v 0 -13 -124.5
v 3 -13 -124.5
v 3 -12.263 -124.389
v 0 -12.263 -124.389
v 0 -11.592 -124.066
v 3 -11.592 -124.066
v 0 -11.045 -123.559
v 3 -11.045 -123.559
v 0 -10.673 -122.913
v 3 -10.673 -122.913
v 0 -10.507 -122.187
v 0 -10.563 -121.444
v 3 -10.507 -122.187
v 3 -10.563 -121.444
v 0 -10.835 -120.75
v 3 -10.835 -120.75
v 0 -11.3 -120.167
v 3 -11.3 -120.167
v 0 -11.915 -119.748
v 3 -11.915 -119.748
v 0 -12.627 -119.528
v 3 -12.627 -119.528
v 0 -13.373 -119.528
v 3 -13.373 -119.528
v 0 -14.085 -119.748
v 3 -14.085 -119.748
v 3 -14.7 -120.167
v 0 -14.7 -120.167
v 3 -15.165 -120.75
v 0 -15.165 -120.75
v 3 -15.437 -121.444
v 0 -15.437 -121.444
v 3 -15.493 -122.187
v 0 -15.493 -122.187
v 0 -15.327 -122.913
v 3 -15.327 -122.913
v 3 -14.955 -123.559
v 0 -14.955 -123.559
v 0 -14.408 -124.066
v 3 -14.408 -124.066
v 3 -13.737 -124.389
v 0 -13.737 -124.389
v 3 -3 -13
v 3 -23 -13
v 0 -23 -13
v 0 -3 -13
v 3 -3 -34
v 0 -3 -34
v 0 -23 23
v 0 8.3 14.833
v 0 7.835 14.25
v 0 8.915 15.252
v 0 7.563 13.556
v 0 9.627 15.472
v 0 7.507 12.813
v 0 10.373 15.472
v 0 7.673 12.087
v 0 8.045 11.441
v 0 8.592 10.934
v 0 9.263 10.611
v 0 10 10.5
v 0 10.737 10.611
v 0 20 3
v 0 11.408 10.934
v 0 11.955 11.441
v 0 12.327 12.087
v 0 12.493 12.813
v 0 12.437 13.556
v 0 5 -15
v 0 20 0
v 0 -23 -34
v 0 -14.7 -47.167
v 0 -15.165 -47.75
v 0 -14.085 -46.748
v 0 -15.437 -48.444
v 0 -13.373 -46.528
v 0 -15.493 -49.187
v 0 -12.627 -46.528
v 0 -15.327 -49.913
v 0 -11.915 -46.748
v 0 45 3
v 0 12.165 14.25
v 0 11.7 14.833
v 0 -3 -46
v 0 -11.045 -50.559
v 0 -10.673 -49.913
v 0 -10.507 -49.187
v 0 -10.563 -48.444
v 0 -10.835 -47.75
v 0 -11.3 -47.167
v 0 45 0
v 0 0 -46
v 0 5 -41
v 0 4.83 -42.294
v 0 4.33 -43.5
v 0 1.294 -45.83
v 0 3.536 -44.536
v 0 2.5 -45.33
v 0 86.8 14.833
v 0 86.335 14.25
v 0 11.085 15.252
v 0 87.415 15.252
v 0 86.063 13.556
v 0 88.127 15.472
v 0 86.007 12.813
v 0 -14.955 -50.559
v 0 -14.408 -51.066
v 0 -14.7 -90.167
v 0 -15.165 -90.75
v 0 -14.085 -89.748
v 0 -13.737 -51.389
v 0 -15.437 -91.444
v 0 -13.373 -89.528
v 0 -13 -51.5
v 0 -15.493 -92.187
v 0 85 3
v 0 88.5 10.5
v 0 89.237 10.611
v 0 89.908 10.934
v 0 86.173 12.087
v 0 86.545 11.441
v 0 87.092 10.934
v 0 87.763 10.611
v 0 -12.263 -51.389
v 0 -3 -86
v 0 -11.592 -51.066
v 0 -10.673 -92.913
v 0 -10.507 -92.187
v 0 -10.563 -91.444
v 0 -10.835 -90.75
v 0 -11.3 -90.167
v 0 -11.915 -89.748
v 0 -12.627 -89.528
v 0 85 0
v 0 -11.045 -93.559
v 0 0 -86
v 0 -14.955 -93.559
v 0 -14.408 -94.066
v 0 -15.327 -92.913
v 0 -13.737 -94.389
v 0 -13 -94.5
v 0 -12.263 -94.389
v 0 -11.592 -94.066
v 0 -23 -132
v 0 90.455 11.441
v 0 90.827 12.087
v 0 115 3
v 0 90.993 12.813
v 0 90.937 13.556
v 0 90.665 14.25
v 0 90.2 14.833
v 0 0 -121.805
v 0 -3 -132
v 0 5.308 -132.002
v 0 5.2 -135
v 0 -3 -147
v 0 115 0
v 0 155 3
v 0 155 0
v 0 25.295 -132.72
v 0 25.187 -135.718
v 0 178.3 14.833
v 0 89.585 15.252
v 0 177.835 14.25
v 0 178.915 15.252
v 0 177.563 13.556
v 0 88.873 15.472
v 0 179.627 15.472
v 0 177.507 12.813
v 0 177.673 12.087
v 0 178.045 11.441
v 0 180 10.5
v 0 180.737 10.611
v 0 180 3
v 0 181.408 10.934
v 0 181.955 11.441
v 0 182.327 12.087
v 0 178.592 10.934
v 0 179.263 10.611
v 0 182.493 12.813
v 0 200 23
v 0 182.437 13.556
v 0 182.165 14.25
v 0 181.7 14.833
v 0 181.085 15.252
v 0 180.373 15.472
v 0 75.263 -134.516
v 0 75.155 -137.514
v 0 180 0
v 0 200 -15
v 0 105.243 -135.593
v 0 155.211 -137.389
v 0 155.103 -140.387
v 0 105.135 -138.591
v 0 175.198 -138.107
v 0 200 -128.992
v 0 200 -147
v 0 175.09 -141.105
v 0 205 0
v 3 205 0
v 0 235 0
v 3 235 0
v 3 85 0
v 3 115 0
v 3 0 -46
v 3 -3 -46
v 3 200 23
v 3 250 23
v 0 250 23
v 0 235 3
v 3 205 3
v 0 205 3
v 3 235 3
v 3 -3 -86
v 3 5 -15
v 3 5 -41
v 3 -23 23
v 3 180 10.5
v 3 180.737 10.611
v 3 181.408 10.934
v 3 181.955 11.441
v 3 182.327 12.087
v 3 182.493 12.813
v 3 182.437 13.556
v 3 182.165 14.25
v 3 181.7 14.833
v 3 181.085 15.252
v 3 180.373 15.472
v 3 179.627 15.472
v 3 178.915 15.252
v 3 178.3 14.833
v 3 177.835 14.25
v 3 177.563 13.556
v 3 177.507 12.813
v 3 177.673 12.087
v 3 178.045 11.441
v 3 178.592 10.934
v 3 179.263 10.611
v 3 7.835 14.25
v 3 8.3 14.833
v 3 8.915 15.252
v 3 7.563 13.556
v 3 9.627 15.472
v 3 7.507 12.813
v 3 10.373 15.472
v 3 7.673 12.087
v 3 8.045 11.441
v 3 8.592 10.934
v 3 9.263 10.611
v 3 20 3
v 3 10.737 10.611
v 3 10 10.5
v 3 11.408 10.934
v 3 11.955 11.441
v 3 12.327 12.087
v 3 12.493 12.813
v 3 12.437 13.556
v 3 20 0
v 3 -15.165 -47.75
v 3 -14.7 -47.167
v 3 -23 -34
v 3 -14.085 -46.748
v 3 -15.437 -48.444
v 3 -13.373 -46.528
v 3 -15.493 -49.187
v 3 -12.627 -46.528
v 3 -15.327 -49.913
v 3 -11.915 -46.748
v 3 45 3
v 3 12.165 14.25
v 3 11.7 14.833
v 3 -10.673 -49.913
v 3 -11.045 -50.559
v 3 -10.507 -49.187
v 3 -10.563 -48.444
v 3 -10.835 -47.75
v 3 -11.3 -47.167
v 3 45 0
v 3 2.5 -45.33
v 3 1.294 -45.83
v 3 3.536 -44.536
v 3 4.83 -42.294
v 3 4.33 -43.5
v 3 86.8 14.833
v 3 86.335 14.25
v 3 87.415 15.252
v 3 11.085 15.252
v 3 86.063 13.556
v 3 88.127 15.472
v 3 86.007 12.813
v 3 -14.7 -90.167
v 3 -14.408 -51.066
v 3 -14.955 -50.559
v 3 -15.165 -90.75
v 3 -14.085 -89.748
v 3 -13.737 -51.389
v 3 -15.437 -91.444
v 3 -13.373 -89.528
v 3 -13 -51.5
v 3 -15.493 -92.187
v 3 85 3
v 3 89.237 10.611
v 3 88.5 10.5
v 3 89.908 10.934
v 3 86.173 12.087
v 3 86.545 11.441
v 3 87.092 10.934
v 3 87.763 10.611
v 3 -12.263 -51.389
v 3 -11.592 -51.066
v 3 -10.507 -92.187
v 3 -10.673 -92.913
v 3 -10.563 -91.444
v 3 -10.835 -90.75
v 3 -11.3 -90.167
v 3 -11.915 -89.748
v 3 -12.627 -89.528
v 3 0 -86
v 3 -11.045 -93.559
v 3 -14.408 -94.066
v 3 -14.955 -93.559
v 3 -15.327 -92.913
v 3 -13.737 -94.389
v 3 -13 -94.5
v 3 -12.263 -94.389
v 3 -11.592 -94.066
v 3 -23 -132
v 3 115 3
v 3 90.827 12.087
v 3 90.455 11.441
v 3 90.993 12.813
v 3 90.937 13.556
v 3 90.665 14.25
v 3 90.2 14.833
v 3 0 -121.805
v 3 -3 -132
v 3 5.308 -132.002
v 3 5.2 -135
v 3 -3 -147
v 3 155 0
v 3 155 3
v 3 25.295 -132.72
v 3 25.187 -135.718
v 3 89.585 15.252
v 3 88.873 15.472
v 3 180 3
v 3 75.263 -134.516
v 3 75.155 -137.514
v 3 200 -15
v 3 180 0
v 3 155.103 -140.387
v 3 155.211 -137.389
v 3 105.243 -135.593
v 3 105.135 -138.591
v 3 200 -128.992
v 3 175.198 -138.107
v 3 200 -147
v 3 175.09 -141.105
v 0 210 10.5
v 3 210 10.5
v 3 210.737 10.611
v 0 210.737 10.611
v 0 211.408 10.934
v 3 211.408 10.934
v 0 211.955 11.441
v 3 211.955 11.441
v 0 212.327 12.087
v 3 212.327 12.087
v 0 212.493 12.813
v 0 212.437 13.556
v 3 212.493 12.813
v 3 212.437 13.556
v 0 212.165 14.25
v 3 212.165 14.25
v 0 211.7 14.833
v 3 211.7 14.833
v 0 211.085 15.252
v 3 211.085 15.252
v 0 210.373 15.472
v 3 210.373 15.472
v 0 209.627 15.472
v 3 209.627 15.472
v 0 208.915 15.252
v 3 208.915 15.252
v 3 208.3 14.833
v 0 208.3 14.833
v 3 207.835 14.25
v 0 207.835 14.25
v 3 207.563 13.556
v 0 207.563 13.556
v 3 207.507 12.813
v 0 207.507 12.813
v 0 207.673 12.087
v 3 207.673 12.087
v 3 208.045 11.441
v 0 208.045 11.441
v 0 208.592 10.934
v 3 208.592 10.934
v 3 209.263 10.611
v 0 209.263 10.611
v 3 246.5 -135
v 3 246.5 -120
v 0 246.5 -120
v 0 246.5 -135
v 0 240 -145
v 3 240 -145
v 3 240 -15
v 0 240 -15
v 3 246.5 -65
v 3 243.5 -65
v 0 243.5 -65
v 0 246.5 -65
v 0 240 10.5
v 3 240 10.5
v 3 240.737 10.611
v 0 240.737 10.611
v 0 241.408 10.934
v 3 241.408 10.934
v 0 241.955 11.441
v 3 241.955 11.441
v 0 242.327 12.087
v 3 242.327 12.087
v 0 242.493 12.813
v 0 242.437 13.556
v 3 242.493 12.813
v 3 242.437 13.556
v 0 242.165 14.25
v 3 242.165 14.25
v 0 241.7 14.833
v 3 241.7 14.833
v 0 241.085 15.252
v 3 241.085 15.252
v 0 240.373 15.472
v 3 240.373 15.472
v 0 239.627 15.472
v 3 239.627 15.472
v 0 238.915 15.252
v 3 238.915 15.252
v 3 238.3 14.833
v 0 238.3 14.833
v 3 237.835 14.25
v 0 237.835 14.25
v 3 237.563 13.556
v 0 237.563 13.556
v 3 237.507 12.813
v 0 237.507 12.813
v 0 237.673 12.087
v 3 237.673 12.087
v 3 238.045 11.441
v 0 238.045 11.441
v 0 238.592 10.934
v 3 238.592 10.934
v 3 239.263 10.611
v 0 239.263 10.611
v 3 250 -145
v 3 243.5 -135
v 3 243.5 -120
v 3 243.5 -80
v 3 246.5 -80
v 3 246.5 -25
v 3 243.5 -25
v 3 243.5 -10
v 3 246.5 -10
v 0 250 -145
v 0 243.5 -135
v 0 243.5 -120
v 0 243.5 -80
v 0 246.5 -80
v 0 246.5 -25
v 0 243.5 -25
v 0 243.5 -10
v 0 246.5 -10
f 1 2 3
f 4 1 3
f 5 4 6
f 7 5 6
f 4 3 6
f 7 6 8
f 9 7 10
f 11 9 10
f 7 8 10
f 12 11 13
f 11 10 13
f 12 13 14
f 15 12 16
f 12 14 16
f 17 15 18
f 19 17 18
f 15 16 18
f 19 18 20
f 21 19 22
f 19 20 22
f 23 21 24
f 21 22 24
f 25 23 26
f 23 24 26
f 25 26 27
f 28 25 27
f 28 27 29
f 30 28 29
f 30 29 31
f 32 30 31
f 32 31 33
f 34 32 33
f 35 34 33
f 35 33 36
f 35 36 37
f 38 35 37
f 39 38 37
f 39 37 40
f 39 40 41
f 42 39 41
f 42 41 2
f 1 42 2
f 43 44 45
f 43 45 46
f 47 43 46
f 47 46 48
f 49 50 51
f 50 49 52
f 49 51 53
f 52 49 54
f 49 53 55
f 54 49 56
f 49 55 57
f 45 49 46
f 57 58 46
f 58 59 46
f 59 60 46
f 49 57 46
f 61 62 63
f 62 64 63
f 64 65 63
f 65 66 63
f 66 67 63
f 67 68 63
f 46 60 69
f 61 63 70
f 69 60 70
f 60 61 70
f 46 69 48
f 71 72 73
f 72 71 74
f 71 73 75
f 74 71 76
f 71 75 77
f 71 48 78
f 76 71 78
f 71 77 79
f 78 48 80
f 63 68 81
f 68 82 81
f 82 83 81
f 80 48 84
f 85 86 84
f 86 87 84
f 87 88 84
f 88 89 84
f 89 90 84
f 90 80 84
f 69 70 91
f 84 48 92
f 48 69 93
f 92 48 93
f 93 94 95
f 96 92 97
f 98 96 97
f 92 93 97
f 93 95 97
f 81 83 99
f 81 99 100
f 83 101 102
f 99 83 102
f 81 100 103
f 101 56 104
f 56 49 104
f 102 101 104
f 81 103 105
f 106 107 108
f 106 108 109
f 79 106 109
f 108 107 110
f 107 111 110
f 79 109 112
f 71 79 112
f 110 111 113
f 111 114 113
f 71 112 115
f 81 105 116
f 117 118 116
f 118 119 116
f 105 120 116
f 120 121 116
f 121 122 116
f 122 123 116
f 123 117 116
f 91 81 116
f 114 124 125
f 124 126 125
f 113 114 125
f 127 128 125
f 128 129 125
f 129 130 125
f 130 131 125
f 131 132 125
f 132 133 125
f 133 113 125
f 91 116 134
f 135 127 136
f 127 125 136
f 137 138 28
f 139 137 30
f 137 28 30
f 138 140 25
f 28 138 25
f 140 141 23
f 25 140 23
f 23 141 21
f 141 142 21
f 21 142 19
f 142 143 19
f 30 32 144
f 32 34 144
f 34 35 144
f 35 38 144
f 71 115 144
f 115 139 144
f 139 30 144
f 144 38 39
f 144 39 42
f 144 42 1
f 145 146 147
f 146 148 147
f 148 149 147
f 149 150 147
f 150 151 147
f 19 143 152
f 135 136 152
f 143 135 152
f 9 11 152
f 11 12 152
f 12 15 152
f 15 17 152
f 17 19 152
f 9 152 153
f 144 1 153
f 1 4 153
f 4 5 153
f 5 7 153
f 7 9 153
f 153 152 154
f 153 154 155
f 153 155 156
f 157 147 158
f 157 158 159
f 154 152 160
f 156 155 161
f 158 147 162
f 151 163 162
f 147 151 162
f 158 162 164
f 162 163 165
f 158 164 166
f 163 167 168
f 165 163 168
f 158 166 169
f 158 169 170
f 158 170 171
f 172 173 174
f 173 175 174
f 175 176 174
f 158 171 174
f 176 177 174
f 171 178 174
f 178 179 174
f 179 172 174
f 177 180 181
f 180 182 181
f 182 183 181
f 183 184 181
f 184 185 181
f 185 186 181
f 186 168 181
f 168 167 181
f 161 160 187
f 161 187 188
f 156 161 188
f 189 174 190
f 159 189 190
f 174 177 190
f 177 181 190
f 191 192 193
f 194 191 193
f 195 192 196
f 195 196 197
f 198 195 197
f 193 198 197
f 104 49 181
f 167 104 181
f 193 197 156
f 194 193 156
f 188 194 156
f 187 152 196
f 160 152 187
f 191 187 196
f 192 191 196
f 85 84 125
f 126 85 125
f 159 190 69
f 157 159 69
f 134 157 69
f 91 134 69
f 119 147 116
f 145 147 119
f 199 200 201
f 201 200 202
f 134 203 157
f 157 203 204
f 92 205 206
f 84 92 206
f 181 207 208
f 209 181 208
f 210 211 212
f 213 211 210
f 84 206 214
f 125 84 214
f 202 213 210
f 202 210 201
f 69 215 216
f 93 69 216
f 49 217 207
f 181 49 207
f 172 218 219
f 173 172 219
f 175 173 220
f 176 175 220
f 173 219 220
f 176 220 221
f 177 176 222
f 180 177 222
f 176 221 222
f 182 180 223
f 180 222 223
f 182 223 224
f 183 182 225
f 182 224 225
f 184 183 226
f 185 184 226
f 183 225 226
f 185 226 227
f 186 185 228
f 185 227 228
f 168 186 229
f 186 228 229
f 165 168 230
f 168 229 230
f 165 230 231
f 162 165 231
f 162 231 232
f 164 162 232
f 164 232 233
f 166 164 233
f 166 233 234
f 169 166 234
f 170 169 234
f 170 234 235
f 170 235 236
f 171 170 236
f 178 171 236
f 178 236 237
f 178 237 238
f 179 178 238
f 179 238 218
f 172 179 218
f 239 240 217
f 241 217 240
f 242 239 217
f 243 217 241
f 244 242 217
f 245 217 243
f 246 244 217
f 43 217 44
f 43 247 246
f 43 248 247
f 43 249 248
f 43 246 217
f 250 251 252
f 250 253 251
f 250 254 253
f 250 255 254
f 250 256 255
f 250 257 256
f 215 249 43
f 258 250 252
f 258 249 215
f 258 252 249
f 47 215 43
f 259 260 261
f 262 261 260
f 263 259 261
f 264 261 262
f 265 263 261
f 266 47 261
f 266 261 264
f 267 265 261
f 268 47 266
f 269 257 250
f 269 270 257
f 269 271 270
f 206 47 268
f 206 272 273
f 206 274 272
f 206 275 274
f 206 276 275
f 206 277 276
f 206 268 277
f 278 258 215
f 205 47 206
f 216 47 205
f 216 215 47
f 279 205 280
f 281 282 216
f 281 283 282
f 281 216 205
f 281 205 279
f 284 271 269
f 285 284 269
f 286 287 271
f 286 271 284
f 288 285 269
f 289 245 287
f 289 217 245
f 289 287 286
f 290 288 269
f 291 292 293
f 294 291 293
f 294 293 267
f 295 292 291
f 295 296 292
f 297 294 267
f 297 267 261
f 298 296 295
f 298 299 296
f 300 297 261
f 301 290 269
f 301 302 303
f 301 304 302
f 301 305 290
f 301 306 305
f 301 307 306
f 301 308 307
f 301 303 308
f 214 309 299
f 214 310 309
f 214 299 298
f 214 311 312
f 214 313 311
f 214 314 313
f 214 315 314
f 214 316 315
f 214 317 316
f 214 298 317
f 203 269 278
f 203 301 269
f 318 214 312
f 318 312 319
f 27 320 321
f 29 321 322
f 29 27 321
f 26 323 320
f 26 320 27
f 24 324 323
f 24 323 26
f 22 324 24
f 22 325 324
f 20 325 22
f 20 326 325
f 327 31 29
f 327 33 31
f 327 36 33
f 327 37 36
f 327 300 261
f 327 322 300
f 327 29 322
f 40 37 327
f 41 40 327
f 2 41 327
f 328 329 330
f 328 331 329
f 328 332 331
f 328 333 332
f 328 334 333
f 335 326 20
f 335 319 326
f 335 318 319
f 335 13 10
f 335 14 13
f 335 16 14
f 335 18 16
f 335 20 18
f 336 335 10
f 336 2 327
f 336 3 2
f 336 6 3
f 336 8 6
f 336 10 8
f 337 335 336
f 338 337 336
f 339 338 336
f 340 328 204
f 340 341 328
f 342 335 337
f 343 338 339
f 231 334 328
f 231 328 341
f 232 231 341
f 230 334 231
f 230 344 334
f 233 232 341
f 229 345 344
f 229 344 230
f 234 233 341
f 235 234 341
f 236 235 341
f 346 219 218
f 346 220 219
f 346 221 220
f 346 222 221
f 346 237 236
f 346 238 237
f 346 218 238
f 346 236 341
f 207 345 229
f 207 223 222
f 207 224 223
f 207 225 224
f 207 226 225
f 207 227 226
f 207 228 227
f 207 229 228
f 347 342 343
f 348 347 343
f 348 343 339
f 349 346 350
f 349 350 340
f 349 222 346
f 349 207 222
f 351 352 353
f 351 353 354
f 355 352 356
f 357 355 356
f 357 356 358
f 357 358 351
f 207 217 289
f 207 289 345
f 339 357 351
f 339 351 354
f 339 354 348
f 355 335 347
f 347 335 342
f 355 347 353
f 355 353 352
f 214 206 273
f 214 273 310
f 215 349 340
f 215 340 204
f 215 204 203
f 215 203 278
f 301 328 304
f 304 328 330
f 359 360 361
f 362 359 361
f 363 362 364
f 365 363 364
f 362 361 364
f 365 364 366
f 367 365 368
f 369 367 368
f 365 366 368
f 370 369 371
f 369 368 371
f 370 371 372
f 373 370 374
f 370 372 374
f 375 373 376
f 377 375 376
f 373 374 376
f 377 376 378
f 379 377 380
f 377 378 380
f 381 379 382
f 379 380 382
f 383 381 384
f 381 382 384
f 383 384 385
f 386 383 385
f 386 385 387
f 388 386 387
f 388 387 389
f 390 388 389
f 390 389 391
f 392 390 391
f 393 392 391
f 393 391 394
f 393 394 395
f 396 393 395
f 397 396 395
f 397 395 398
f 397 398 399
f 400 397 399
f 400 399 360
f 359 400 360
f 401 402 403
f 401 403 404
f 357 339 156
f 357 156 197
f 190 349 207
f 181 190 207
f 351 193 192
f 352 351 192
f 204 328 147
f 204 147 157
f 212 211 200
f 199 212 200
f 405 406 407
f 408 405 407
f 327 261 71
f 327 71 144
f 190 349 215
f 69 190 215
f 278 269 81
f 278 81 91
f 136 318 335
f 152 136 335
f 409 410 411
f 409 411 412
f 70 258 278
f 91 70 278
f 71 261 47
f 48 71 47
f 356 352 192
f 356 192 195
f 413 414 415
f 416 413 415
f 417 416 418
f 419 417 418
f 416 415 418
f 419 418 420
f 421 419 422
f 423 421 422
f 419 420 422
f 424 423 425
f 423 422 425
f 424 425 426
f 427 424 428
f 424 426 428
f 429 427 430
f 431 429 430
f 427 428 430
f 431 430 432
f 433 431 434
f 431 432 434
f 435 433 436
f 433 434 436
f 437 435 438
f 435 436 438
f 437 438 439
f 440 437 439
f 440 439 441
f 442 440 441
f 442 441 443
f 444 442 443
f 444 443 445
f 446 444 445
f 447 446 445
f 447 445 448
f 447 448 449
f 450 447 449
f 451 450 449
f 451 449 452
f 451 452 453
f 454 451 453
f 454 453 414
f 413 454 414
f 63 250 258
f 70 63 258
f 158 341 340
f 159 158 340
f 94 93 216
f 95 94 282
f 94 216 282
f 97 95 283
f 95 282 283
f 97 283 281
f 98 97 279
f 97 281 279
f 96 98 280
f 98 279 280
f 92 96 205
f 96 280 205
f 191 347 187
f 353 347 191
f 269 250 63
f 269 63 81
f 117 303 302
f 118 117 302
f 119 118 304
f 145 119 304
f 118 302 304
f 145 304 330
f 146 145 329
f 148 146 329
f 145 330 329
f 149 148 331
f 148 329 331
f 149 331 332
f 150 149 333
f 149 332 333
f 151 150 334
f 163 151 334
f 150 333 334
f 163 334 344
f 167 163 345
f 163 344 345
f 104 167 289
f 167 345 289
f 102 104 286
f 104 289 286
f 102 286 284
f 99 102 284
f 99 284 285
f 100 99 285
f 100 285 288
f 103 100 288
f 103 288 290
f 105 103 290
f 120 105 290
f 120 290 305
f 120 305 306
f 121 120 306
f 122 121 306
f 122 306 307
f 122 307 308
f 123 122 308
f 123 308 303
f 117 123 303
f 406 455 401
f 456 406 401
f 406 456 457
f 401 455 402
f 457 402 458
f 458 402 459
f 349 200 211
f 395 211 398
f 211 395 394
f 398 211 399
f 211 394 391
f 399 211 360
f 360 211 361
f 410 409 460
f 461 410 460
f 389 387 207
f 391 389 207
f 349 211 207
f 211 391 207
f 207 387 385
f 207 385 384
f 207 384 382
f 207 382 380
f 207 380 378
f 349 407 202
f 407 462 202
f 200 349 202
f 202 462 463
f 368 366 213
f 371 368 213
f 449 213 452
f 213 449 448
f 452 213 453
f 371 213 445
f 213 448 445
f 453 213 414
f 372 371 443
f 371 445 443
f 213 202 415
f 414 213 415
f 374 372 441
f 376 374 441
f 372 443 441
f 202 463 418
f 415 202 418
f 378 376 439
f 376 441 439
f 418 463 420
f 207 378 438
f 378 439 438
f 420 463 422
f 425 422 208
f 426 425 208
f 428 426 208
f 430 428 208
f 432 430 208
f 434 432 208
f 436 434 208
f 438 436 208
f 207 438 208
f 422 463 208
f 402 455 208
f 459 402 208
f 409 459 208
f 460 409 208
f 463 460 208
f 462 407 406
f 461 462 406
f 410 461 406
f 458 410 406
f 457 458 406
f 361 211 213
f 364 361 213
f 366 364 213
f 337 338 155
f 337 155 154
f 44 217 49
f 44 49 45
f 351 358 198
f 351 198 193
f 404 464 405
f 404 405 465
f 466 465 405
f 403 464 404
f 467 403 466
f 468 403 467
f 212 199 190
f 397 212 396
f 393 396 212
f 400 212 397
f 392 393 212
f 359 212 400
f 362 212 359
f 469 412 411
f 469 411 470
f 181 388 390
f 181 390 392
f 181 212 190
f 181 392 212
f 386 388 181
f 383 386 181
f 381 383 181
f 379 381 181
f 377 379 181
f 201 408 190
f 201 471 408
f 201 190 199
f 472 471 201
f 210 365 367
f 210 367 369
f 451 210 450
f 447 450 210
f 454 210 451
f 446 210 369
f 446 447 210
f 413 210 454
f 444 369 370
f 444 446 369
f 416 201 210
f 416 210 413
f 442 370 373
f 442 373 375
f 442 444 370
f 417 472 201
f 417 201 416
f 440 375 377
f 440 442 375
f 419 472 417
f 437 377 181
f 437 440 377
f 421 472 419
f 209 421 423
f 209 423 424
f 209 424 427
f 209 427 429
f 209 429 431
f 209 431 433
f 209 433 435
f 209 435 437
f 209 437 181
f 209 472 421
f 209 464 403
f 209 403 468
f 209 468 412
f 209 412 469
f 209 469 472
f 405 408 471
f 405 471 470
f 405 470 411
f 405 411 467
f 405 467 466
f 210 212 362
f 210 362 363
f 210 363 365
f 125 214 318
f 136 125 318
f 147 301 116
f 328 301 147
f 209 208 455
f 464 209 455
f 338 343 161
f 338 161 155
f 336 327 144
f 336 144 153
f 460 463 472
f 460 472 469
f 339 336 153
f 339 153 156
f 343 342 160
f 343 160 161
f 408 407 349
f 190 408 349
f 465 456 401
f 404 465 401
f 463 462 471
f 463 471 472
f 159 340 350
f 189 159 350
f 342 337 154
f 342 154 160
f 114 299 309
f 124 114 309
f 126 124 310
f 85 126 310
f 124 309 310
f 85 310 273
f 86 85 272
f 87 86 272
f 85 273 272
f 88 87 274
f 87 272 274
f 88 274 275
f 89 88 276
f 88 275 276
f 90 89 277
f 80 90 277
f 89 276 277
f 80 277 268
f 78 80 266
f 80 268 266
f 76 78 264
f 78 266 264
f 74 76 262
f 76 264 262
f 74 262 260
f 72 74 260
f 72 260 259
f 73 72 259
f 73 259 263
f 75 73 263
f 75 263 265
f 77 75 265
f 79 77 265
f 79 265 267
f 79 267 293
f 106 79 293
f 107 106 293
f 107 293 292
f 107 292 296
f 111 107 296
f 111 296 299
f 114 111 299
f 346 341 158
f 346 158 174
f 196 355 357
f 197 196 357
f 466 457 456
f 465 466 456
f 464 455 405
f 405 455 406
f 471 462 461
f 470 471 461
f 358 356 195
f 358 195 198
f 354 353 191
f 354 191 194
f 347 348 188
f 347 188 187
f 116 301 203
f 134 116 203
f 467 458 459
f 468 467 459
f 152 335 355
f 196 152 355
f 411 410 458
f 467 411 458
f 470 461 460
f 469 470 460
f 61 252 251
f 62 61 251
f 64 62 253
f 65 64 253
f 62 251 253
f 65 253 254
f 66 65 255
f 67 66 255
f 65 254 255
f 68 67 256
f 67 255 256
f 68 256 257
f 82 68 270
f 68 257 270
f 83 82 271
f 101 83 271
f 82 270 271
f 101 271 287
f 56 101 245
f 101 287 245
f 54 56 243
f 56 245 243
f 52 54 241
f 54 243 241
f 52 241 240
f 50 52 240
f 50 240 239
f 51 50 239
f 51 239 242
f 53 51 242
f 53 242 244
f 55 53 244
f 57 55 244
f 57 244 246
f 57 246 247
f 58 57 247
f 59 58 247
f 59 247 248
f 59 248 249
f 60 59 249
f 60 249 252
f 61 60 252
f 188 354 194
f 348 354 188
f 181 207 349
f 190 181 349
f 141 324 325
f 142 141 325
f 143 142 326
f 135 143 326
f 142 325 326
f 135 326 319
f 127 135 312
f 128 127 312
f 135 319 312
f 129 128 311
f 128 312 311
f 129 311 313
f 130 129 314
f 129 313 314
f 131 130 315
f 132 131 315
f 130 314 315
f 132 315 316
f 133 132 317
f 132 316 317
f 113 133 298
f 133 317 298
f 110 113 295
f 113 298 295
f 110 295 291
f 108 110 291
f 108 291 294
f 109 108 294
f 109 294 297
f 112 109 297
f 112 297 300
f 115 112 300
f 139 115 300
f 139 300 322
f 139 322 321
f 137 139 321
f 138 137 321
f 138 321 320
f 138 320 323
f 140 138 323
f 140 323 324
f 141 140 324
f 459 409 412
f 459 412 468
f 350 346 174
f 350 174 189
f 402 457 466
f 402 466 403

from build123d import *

# Parameters (mm, degrees)
SKETCH1_W           = 132
SKETCH1_H           = 200
BOSS_EXTRUDE1_DEPTH = 3
SKETCH5_W           = 170
SKETCH5_H           = 223
BOSS_EXTRUDE2_DEPTH = 3
CUT_EXTRUDE1_DEPTH  = 4
SKETCH3_R           = 2.5
CUT_EXTRUDE2_DEPTH  = 4
SKETCH6_W           = 21
SKETCH6_H           = 20
CUT_EXTRUDE4_DEPTH  = 4
SKETCH7_W           = 15
SKETCH7_H           = 20
CUT_EXTRUDE5_DEPTH  = 4
CUT_EXTRUDE3_DEPTH  = 4
SKETCH8_W           = 3
SKETCH8_H           = 25
SKETCH8_H_2         = 30
CUT_EXTRUDE6_DEPTH  = 4
SKETCH9_R           = 2.5
CUT_EXTRUDE7_DEPTH  = 4
BOSS_EXTRUDE3_DEPTH = 3
SKETCH11_W          = 15
SKETCH11_H          = 3
CUT_EXTRUDE8_DEPTH  = 3
SKETCH12_R          = 2.5
CUT_EXTRUDE9_DEPTH  = 10
SKETCH13_W          = 3
SKETCH13_H          = 30
CUT_EXTRUDE10_DEPTH = 10


with BuildPart() as part:
    # Sketch1 → Boss-Extrude1 (new body)
    with BuildSketch(Plane(origin=(0, 0, 0), x_dir=(0, 0, -1), z_dir=(1, 0, 0))):
        with Locations((66, 100)):
            Rectangle(SKETCH1_W, SKETCH1_H)
    extrude(amount=BOSS_EXTRUDE1_DEPTH)

    # Sketch5 → Boss-Extrude2 (add, through all)
    with BuildSketch(Plane(origin=(3, 0, 0), x_dir=(0, 0, -1), z_dir=(1, 0, 0))):
        with Locations((62, 88.5)):
            Rectangle(SKETCH5_W, SKETCH5_H)
    extrude(amount=-BOSS_EXTRUDE2_DEPTH)

    # Sketch2 → Cut-Extrude1 (cut, through all)
    with BuildSketch(Plane(origin=(3, 0, 0), x_dir=(0, 0, -1), z_dir=(1, 0, 0))):
        Polygon((135, 5.2), (132.001935036, 5.307733341), (132.720157307, 25.294833099), (135.718222271, 25.187099759), align=None)
        Polygon((138.106824336, 175.198081291), (141.1048893, 175.09034795), (140.386667029, 155.103248191), (137.388602066, 155.210981532), align=None)
        Polygon((135.593046389, 105.243232135), (138.591111353, 105.135498794), (137.513777947, 75.154849156), (134.515712983, 75.262582497), align=None)
    extrude(amount=-CUT_EXTRUDE1_DEPTH, mode=Mode.SUBTRACT)

    # Sketch3 → Cut-Extrude2 (cut, through all)
    with BuildSketch(Plane(origin=(3, 0, 0), x_dir=(0, 0, -1), z_dir=(1, 0, 0))):
        with Locations((122, -13)):
            Circle(SKETCH3_R)
        with Locations((92, -13)):
            Circle(SKETCH3_R)
        with Locations((-13, 10)):
            Circle(SKETCH3_R)
        with Locations((49, -13)):
            Circle(SKETCH3_R)
    extrude(amount=-CUT_EXTRUDE2_DEPTH, mode=Mode.SUBTRACT)

    # Sketch6 → Cut-Extrude4 (cut, through all)
    with BuildSketch(Plane(origin=(3, 0, 0), x_dir=(0, 0, -1), z_dir=(1, 0, 0))):
        with Locations((23.5, -13)):
            Rectangle(SKETCH6_W, SKETCH6_H)
    extrude(amount=-CUT_EXTRUDE4_DEPTH, mode=Mode.SUBTRACT)

    # Sketch7 → Cut-Extrude5 (cut, through all)
    with BuildSketch(Plane(origin=(3, 0, 0), x_dir=(0, 0, -1), z_dir=(1, 0, 0))):
        with Locations((139.5, -13)):
            Rectangle(SKETCH7_W, SKETCH7_H)
    extrude(amount=-CUT_EXTRUDE5_DEPTH, mode=Mode.SUBTRACT)

    # Sketch4 → Cut-Extrude3 (cut, through all)
    with BuildSketch(Plane(origin=(3, 0, 0), x_dir=(0, 0, -1), z_dir=(1, 0, 0))):
        with BuildLine():
            Line((128.991609431, 200), (15, 200))
            Line((15, 200), (15, 5))
            Line((15, 5), (41, 5))
            ThreePointArc((41, 5), (44.535533906, 3.535533906), (46, 0))
            Line((46, 0), (46, -3))
            Line((46, -3), (86, -3))
            Line((86, -3), (86, 0))
            Line((86, 0), (121.804751115, 0))
            Line((121.804751115, 0), (128.991609431, 200))
        make_face()
    extrude(amount=-CUT_EXTRUDE3_DEPTH, mode=Mode.SUBTRACT)

    # Sketch8 → Cut-Extrude6 (cut, through all)
    with BuildSketch(Plane(origin=(3, 0, 0), x_dir=(0, 0, -1), z_dir=(1, 0, 0))):
        with Locations((-1.5, 167.5)):
            Rectangle(SKETCH8_W, SKETCH8_H)
        with Locations((-1.5, 100)):
            Rectangle(SKETCH8_W, SKETCH8_H_2)
        with Locations((-1.5, 32.5)):
            Rectangle(SKETCH8_W, SKETCH8_H)
    extrude(amount=-CUT_EXTRUDE6_DEPTH, mode=Mode.SUBTRACT)

    # Sketch9 → Cut-Extrude7 (cut, through all)
    with BuildSketch(Plane(origin=(3, 0, 0), x_dir=(0, 0, -1), z_dir=(1, 0, 0))):
        with Locations((-13, 180)):
            Circle(SKETCH9_R)
        with Locations((-13, 88.5)):
            Circle(SKETCH9_R)
    extrude(amount=-CUT_EXTRUDE7_DEPTH, mode=Mode.SUBTRACT)


with BuildPart() as body_2:
    # Sketch10 → Boss-Extrude3 (new body)
    with BuildSketch(Plane(origin=(3, 0, 0), x_dir=(0, 0, -1), z_dir=(1, 0, 0))):
        Polygon((15, 240), (15, 200), (-23, 200), (-23, 250), (145, 250), (145, 240), align=None)
    extrude(amount=-BOSS_EXTRUDE3_DEPTH)

    # Sketch11 → Cut-Extrude8 (cut)
    with BuildSketch(Plane(origin=(3, 0, 0), x_dir=(0, 0, -1), z_dir=(1, 0, 0))):
        with Locations((127.5, 245)):
            Rectangle(SKETCH11_W, SKETCH11_H)
        with Locations((72.5, 245)):
            Rectangle(SKETCH11_W, SKETCH11_H)
        with Locations((17.5, 245)):
            Rectangle(SKETCH11_W, SKETCH11_H)
    extrude(amount=-CUT_EXTRUDE8_DEPTH, mode=Mode.SUBTRACT)

    # Sketch12 → Cut-Extrude9 (cut)
    with BuildSketch(Plane(origin=(3, 0, 0), x_dir=(0, 0, -1), z_dir=(1, 0, 0))):
        with Locations((-13, 240)):
            Circle(SKETCH12_R)
        with Locations((-13, 210)):
            Circle(SKETCH12_R)
    extrude(amount=-CUT_EXTRUDE9_DEPTH, mode=Mode.SUBTRACT)

    # Sketch13 → Cut-Extrude10 (cut)
    with BuildSketch(Plane(origin=(3, 0, 0), x_dir=(0, 0, -1), z_dir=(1, 0, 0))):
        with Locations((-1.5, 220)):
            Rectangle(SKETCH13_W, SKETCH13_H)
    extrude(amount=-CUT_EXTRUDE10_DEPTH, mode=Mode.SUBTRACT)


solid = Compound([part.part, body_2.part])
